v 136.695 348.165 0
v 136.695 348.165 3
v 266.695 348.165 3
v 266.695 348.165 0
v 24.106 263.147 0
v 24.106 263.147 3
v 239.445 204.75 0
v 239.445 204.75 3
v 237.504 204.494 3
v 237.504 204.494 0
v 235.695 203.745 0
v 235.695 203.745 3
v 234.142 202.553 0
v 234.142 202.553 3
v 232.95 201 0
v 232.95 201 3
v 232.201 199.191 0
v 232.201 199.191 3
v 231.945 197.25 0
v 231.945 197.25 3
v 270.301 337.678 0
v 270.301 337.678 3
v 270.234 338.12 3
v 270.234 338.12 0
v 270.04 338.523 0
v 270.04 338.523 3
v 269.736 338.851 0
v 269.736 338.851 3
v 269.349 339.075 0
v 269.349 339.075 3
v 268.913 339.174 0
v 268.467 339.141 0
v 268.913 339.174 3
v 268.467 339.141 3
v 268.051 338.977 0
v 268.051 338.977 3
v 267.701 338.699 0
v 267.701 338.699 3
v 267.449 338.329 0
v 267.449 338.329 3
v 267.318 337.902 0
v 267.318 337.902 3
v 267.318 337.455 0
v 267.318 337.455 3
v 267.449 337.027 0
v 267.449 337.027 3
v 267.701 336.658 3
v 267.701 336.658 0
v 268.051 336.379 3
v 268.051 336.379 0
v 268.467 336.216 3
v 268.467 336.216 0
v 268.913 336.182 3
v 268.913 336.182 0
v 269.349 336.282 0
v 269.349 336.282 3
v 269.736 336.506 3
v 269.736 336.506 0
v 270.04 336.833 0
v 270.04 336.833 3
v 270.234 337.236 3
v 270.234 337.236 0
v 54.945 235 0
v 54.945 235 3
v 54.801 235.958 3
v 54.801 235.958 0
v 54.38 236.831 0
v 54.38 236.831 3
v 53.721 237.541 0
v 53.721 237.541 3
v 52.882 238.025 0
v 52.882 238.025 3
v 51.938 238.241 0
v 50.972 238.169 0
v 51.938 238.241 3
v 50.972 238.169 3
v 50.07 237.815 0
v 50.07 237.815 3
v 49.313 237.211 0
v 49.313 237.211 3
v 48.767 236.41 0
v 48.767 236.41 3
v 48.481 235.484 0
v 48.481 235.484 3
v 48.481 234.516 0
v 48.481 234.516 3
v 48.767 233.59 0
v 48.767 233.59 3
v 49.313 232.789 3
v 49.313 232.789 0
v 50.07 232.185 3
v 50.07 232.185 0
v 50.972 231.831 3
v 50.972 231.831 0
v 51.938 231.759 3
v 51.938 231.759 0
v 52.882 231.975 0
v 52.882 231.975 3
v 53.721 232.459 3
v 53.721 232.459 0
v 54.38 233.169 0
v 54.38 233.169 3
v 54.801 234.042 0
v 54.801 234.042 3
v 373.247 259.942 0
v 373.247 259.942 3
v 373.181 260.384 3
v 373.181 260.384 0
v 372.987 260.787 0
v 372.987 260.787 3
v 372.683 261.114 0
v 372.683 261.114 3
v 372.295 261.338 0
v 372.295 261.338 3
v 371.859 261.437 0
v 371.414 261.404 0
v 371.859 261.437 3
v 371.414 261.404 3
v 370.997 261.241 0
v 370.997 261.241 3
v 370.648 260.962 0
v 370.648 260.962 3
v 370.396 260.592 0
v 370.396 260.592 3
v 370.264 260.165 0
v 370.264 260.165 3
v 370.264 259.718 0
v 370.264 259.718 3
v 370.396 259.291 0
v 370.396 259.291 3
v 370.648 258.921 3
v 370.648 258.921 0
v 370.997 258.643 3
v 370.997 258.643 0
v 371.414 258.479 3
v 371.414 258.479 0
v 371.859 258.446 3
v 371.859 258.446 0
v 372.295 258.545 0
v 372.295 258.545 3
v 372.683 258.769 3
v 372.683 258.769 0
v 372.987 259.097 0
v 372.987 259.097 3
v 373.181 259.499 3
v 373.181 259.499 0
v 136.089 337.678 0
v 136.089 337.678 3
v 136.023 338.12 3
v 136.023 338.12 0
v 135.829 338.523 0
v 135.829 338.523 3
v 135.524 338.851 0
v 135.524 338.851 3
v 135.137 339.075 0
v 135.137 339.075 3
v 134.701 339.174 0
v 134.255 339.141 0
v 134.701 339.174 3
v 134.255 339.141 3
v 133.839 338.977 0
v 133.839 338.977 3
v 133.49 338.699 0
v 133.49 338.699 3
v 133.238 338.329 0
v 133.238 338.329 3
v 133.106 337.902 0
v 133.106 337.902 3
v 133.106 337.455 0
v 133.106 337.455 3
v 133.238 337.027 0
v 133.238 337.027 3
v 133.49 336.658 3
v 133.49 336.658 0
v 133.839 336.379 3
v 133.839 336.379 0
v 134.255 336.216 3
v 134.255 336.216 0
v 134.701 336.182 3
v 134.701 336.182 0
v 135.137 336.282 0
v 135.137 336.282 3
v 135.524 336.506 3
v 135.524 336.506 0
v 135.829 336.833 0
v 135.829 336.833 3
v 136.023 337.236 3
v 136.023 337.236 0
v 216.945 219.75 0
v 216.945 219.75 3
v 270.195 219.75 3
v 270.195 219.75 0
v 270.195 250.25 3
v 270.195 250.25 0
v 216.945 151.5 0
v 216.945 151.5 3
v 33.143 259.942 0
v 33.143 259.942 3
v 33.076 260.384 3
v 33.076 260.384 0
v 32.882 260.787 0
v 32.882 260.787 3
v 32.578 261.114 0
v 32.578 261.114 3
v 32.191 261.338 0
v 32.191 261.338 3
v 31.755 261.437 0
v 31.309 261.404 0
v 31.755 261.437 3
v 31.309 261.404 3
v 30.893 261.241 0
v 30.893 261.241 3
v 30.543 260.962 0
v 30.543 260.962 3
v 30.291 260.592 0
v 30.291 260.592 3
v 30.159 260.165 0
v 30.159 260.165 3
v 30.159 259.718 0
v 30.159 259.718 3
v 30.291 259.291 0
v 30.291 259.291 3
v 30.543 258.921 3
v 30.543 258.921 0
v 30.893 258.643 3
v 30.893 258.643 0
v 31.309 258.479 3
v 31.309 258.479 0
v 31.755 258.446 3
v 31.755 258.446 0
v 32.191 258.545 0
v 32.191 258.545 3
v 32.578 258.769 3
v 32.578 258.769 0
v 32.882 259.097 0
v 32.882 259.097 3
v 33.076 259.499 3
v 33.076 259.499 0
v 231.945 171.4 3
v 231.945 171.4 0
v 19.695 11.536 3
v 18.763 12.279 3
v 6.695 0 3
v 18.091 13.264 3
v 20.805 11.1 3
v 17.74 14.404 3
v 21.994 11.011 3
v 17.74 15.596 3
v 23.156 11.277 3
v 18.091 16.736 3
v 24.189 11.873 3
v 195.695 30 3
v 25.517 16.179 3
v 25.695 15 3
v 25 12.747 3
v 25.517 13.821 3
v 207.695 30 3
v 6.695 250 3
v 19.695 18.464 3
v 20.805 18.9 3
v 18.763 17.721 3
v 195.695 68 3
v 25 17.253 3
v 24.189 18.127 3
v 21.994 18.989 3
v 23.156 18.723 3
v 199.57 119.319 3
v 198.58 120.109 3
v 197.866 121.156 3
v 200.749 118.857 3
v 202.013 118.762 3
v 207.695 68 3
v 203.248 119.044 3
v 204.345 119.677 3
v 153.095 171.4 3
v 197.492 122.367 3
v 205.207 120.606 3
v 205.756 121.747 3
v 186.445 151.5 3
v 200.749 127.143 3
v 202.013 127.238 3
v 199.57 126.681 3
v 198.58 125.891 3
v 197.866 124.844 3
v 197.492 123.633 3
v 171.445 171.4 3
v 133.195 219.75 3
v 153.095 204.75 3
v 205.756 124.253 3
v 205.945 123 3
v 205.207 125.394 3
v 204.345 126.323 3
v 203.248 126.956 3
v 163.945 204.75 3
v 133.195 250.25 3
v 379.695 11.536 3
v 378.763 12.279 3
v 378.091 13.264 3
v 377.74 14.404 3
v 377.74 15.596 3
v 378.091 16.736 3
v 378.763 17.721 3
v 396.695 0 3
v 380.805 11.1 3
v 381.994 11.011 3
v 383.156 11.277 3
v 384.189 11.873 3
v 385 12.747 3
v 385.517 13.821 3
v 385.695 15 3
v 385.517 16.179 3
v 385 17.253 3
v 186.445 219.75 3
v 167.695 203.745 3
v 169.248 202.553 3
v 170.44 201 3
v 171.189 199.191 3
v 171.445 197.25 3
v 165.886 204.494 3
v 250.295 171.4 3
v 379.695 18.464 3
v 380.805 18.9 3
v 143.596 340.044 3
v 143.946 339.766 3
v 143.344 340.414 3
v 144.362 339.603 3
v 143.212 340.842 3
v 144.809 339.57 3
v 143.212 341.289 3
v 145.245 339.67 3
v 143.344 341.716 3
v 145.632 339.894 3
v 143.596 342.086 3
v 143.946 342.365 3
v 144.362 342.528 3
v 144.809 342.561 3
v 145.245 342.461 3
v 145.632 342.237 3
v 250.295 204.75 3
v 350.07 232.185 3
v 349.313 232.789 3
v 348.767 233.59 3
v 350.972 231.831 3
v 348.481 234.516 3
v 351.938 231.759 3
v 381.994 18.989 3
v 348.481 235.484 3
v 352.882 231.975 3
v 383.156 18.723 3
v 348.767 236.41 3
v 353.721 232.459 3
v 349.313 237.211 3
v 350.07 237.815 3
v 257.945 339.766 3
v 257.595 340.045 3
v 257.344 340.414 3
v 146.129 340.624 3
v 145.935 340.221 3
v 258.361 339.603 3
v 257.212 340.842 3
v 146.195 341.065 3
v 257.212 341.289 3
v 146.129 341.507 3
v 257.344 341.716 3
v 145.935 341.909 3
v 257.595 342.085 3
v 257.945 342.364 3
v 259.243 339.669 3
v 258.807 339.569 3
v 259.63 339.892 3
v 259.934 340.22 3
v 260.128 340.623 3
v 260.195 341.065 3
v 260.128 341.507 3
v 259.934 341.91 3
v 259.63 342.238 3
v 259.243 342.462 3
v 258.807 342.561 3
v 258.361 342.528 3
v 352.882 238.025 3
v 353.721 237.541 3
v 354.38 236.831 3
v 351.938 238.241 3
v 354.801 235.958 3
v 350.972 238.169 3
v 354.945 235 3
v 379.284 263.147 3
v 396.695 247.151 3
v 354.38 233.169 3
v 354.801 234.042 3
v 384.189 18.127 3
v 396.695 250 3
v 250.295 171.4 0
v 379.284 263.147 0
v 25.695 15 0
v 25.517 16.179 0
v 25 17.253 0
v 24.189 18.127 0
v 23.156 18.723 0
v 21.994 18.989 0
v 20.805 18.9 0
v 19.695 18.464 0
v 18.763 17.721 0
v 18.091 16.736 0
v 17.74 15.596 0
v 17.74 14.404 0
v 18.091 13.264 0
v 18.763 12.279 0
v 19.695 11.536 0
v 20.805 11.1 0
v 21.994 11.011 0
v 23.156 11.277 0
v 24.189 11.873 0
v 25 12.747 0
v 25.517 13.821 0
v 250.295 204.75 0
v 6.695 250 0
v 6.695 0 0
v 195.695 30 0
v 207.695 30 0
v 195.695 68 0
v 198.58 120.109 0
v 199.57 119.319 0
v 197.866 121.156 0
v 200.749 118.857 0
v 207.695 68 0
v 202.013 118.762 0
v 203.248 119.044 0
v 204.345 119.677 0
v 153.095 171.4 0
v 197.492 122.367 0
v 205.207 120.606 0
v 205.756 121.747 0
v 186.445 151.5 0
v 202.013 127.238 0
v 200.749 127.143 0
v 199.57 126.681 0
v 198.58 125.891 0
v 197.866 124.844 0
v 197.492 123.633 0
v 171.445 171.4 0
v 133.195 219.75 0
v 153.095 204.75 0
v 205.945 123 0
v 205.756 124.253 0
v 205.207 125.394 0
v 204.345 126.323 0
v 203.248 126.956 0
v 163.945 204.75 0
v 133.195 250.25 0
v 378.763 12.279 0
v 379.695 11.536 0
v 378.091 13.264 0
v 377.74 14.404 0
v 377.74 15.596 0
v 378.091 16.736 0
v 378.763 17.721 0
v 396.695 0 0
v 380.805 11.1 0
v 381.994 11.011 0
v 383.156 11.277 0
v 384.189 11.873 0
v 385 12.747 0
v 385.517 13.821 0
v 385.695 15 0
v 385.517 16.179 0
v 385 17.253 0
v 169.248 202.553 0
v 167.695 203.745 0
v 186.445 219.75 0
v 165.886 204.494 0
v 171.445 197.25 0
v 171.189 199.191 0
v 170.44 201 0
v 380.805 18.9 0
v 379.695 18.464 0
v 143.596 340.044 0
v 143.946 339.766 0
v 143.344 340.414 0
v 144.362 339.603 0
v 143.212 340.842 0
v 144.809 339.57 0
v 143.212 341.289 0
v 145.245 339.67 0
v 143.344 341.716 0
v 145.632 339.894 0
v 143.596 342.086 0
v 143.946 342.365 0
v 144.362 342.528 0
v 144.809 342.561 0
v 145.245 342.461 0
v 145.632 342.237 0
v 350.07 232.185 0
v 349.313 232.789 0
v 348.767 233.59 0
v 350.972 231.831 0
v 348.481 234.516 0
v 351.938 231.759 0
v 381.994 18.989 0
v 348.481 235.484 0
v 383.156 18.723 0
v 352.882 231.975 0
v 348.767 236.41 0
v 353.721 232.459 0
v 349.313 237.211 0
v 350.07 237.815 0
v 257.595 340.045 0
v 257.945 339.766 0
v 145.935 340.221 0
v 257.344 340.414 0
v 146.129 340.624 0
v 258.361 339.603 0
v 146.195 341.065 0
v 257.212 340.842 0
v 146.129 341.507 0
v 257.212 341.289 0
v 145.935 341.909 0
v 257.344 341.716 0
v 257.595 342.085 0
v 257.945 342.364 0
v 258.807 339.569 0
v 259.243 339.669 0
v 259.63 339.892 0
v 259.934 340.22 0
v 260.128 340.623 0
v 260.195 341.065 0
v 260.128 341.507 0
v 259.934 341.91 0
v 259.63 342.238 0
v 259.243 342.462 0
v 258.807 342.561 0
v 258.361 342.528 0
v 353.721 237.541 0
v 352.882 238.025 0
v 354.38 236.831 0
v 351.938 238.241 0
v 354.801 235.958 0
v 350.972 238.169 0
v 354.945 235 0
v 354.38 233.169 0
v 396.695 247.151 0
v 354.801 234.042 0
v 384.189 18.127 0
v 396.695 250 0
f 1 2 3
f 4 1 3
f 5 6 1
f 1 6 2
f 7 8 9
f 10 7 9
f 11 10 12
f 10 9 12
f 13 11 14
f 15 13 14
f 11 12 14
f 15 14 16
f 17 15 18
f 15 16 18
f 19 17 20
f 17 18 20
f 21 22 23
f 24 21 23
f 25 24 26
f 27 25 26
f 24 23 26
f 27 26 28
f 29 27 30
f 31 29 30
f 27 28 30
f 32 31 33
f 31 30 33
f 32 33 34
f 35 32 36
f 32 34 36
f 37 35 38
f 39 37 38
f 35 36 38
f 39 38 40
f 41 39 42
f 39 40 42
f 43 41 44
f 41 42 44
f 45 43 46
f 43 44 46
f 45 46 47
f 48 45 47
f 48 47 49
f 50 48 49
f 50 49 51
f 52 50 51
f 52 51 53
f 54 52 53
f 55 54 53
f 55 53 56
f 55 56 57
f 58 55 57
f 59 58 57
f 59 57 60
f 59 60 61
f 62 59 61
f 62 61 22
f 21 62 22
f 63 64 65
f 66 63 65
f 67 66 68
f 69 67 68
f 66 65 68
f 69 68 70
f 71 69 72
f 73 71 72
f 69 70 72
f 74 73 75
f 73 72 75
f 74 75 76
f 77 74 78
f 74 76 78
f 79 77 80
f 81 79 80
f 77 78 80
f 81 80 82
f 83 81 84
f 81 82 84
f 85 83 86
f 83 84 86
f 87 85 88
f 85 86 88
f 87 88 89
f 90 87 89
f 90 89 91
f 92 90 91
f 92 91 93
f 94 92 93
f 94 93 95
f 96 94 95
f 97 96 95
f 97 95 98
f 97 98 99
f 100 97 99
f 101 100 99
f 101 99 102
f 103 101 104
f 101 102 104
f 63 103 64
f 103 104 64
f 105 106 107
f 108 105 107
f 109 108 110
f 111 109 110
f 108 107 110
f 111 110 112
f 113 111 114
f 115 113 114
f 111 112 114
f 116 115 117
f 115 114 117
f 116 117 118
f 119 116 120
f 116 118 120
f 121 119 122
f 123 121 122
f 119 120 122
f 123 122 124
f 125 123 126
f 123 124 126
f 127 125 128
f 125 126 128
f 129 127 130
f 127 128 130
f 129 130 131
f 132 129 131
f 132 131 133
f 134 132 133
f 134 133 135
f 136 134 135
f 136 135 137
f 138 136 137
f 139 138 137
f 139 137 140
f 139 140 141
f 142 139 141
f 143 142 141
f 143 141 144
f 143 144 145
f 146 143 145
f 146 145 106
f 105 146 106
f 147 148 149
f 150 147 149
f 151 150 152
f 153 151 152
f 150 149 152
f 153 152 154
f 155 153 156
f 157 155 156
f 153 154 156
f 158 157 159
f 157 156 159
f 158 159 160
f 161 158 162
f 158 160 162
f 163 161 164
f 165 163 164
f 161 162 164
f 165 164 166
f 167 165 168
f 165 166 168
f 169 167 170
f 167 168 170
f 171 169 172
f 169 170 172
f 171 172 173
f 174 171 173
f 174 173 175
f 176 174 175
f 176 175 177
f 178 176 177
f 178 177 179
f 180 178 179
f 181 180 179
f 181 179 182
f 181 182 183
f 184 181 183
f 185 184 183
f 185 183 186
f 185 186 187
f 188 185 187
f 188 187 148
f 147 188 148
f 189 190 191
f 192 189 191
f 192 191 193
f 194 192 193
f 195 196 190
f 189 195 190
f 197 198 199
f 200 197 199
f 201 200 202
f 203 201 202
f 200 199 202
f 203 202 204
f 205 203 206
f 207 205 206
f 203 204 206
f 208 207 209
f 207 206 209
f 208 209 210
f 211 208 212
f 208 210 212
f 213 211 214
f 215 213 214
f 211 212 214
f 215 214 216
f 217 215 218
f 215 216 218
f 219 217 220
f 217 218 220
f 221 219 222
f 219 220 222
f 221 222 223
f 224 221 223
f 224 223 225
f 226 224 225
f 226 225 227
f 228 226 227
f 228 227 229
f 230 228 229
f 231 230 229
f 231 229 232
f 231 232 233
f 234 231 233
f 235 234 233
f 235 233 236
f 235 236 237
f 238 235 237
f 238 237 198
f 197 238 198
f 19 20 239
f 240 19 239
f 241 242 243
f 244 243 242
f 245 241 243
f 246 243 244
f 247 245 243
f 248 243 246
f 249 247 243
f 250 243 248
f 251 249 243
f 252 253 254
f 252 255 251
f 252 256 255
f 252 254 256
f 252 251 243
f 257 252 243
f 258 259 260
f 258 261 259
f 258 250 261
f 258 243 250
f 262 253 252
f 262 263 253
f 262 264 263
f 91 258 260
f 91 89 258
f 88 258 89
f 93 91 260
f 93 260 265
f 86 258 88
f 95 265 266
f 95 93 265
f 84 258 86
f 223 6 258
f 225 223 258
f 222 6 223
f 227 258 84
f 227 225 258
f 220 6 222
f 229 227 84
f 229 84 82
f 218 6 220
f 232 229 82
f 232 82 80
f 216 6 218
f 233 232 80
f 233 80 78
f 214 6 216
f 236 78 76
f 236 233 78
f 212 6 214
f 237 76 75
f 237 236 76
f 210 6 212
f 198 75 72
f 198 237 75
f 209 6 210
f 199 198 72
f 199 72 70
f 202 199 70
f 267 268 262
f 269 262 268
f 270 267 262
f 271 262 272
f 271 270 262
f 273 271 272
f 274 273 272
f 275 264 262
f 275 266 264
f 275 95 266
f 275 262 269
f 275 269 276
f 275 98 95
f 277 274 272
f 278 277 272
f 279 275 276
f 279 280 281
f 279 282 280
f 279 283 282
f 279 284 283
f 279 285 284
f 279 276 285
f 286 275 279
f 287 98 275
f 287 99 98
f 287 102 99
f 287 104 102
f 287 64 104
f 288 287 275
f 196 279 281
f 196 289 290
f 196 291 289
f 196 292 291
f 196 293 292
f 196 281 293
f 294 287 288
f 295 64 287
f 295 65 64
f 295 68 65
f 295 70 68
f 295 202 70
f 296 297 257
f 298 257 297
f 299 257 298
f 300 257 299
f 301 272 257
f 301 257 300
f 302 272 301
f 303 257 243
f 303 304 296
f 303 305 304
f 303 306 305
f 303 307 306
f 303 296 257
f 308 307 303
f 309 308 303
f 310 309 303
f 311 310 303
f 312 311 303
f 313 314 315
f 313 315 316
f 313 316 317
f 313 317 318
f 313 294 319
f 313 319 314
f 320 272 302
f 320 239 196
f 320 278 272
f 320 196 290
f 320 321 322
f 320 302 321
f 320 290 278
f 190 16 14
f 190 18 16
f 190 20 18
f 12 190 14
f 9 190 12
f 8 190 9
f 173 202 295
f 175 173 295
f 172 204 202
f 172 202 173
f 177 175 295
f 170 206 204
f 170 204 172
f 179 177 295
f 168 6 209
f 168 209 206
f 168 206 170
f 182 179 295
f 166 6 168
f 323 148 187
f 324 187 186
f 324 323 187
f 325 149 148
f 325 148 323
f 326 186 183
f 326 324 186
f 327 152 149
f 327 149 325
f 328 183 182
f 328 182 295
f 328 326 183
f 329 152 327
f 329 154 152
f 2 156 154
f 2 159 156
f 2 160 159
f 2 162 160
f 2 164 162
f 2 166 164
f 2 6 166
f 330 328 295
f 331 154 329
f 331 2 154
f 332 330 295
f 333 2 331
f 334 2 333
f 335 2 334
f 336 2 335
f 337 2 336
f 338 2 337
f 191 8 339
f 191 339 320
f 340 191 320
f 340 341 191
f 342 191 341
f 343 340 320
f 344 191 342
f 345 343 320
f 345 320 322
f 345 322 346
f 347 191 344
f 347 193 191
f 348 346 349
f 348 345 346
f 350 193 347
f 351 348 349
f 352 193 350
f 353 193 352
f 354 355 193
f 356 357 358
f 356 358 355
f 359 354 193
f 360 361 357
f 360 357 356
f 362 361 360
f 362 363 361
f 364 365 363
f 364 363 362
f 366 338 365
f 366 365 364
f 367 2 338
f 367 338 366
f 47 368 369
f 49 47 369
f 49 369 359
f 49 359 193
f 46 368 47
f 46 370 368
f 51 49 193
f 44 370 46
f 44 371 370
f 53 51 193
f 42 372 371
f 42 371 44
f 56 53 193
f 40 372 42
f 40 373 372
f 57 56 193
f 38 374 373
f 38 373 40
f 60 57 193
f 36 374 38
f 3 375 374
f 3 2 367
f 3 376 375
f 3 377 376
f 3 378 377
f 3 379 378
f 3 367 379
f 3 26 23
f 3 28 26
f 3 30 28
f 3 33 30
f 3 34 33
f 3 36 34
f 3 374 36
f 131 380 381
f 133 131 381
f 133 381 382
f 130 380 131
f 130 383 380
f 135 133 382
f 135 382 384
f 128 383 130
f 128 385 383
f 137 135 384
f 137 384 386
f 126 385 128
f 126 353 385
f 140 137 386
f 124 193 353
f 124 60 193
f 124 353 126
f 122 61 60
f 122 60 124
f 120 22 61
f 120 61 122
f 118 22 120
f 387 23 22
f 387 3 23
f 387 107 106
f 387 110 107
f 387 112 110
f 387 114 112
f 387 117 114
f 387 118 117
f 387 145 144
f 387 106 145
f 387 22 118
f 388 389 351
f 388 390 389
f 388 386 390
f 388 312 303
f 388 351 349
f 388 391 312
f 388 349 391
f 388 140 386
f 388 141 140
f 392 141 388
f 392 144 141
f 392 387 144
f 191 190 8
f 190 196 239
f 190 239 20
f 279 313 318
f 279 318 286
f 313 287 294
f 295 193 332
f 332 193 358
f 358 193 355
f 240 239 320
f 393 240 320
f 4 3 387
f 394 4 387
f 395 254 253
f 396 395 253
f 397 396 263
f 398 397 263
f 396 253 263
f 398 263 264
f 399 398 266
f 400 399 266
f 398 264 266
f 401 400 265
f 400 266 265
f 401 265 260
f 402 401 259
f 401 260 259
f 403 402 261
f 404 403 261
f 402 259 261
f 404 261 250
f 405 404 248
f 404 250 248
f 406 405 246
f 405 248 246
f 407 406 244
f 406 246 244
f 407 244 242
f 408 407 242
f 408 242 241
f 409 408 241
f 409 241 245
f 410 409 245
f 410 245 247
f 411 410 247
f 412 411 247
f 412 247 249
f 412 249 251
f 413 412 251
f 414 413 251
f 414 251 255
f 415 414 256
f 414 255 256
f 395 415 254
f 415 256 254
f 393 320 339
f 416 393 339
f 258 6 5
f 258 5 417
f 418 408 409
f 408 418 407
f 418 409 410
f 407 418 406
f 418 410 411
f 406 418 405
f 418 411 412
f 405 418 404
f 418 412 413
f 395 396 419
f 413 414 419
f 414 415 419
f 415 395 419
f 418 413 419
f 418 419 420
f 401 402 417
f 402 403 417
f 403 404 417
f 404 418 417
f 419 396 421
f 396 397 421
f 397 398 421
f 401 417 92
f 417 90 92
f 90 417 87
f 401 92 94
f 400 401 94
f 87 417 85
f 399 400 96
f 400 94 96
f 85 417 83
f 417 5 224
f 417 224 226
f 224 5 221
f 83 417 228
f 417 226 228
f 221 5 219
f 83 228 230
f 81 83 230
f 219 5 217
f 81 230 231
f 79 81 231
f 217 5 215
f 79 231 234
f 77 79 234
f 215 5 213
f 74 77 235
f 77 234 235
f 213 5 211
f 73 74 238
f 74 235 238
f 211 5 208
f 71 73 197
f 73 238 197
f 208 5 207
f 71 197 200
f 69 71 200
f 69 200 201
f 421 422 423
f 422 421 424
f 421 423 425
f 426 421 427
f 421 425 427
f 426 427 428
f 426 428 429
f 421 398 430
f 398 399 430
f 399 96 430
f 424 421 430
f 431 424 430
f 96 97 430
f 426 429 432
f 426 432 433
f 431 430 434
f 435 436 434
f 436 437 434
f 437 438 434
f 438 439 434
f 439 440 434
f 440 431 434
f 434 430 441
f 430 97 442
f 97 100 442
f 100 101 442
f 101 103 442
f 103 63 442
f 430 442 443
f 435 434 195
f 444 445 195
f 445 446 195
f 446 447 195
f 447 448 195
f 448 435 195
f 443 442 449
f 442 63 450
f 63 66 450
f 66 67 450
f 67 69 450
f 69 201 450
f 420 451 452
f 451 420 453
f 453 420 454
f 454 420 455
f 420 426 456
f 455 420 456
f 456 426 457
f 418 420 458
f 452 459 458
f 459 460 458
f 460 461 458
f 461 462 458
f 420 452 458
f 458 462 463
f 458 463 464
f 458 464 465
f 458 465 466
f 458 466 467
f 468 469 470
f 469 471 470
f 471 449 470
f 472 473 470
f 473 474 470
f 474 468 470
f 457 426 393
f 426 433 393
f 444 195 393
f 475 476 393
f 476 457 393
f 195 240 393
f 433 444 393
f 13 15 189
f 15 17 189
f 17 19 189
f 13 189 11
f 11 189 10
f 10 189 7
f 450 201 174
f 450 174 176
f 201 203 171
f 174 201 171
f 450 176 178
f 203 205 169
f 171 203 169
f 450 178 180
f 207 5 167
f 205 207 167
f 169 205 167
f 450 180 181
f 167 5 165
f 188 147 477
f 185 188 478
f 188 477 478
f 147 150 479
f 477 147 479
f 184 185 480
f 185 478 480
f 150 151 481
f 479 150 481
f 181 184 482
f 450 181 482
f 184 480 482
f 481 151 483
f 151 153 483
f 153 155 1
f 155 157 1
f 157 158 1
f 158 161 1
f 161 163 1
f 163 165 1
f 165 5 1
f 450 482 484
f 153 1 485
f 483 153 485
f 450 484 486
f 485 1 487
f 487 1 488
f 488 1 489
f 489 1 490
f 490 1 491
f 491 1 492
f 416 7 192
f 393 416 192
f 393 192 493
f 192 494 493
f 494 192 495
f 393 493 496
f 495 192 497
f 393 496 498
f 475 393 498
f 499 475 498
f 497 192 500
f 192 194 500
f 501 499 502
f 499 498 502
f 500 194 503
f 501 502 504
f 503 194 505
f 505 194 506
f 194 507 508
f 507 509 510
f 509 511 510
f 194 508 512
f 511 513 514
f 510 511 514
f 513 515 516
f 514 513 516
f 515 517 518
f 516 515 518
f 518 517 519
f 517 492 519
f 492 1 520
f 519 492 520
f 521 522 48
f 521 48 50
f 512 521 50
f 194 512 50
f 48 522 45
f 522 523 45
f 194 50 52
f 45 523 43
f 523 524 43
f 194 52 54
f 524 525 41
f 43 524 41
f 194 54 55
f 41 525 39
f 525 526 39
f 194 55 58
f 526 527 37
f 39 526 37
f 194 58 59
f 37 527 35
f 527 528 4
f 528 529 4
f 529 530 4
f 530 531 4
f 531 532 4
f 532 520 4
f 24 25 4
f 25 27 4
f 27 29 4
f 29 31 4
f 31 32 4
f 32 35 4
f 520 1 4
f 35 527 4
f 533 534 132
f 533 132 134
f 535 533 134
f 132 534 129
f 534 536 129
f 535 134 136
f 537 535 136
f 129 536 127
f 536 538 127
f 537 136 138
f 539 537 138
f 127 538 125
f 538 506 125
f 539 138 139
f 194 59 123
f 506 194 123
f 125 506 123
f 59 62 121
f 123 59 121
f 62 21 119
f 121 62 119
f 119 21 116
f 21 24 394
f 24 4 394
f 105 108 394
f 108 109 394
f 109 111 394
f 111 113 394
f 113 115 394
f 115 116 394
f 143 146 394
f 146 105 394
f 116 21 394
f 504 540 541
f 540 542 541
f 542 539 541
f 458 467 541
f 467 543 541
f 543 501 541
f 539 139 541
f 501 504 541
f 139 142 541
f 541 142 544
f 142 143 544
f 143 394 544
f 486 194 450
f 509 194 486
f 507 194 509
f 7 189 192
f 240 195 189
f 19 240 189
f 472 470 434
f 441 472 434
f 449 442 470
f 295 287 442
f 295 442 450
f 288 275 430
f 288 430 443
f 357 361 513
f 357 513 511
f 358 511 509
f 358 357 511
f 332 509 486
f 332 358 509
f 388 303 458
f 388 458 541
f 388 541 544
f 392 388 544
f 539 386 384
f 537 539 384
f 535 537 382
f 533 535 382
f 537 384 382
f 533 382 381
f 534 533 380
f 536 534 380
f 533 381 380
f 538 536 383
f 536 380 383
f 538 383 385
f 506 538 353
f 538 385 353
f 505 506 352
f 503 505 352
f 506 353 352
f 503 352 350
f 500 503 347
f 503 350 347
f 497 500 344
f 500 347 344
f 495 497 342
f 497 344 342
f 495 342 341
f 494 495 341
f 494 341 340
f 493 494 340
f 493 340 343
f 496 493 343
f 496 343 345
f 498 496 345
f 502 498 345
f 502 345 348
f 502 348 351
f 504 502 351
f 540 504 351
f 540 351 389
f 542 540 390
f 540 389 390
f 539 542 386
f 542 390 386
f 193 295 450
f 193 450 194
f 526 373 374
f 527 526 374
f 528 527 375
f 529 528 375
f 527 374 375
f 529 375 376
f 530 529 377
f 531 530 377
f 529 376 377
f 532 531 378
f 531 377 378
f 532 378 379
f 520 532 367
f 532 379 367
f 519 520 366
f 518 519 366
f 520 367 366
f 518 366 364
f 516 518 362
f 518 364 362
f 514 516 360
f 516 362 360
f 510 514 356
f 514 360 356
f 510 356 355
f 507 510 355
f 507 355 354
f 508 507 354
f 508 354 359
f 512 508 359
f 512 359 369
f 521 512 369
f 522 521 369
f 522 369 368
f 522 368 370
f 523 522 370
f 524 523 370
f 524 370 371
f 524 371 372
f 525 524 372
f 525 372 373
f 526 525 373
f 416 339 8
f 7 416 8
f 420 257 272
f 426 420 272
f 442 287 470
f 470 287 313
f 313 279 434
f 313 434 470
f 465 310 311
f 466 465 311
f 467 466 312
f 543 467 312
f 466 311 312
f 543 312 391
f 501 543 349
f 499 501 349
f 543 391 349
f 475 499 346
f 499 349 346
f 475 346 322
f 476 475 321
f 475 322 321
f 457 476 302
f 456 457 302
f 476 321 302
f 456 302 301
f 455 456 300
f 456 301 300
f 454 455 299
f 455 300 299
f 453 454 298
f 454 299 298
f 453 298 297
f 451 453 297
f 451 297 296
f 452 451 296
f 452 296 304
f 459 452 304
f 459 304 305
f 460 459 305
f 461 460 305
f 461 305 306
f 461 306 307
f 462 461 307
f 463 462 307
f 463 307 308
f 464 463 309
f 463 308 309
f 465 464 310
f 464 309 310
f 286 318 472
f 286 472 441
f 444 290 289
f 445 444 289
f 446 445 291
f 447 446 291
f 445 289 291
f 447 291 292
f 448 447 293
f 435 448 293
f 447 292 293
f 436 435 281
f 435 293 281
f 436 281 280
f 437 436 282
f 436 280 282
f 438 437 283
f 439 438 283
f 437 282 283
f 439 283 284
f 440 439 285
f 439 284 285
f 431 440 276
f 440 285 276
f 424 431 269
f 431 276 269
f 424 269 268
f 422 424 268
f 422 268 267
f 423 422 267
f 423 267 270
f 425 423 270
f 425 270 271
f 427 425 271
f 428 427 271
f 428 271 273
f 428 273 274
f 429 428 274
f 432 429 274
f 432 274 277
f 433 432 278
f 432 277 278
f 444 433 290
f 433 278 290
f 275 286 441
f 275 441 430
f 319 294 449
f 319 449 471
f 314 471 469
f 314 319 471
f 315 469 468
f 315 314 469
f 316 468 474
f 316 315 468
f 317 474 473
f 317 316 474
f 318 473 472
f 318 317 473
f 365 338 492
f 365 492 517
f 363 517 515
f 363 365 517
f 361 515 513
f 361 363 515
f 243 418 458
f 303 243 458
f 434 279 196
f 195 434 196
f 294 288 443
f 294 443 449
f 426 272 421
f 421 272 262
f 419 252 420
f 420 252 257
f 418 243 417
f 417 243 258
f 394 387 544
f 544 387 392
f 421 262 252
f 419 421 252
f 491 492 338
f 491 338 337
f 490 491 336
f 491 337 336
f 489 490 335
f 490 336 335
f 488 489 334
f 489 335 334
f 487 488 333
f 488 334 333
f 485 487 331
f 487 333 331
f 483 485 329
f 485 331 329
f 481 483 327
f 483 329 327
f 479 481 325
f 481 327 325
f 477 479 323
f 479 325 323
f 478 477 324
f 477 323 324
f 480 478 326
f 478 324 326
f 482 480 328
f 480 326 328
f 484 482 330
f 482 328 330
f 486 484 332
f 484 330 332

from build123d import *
from build123d.topology import SkipClean

# Parameters (mm, degrees)
BOSS_EXTRUDE1_DEPTH     = 3
CROQUIS1_W              = 50.575264902
CROQUIS1_H              = 364.883290788
CROQUIS1_W_2            = 121.011581191
CROQUIS1_H_2            = 356.31671178
CORTAR_EXTRUIR1_DEPTH   = 10
CROQUIS2_W              = 390
CROQUIS2_H              = 250
SALIENTE_EXTRUIR1_DEPTH = 3
CROQUIS3_W              = 60
CROQUIS3_H              = 30
CORTAR_EXTRUIR3_DEPTH   = 3
CROQUIS4_W              = 90
CROQUIS4_H              = 3
SALIENTE_EXTRUIR2_DEPTH = 3
CROQUIS5_W              = 30
CROQUIS5_H              = 30
CORTAR_EXTRUIR4_DEPTH   = 3
CROQUIS6_W              = 30
CROQUIS6_H              = 38.5
CORTAR_EXTRUIR5_DEPTH   = 3
CROQUIS7_W              = 38.5
CROQUIS7_H              = 30
CORTAR_EXTRUIR6_DEPTH   = 3
CROQUIS8_W              = 137
CROQUIS8_H              = 0.25
CORTAR_EXTRUIR7_DEPTH   = 3
CROQUIS9_W              = 0.25
CROQUIS9_H              = 68.25
CORTAR_EXTRUIR8_DEPTH   = 3
CORTAR_EXTRUIR9_DEPTH   = 3
SALIENTE_EXTRUIR3_DEPTH = 3
CROQUIS12_R             = 4
CORTAR_EXTRUIR10_DEPTH  = 3
CROQUIS13_R             = 4.25
CROQUIS13_R_2           = 3.25
SALIENTE_EXTRUIR4_DEPTH = 3
CROQUIS14_R             = 4.25
CORTAR_EXTRUIR11_DEPTH  = 3
CROQUIS15_R             = 4.25
CORTAR_EXTRUIR12_DEPTH  = 25
SALIENTE_EXTRUIR5_DEPTH = 3
CROQUIS17_R             = 1.5
CORTAR_EXTRUIR13_DEPTH  = 10
CROQUIS18_R             = 1.5
CORTAR_EXTRUIR14_DEPTH  = 30
CROQUIS19_R             = 1.5
SALIENTE_EXTRUIR6_DEPTH = 3
CROQUIS21_R             = 1.5
CORTAR_EXTRUIR15_DEPTH  = 3
SALIENTE_EXTRUIR7_DEPTH = 3
CORTAR_EXTRUIR17_DEPTH  = 10
CORTAR_EXTRUIR18_DEPTH  = 10


with BuildPart() as part:
    # Sketch1 → Boss-Extrude1 (new body)
    with BuildSketch(Plane.XY):
        Polygon((0, 0), (403.39, 0), (403.39, 241), (274.41, 359.5), (128.98, 359.5), (0, 241), align=None)
        Polygon((216.695, 223), (246.695, 223), (246.695, 253), (156.695, 253), (156.695, 223), (186.695, 223), (186.695, 219.825), (216.695, 219.825), align=None, mode=Mode.SUBTRACT)
    extrude(amount=BOSS_EXTRUDE1_DEPTH)

    # Croquis1 → Cortar-Extruir1 (cut)
    with BuildSketch(Plane.XY.offset(3)):
        with Locations((-18.592632451, 182.441645394)):
            Rectangle(CROQUIS1_W, CROQUIS1_H)
        with Locations((457.200790596, 178.15835589)):
            Rectangle(CROQUIS1_W_2, CROQUIS1_H_2)
    extrude(amount=-CORTAR_EXTRUIR1_DEPTH, mode=Mode.SUBTRACT)

    # Croquis2 → Saliente-Extruir1 (add)
    with BuildSketch(Plane.XY.offset(3)):
        with Locations((201.695, 125)):
            Rectangle(CROQUIS2_W, CROQUIS2_H)
    extrude(amount=-SALIENTE_EXTRUIR1_DEPTH)

    # Croquis3 → Cortar-Extruir3 (cut)
    with BuildSketch(Plane.XY.offset(3)):
        with Locations((201.695, 235)):
            Rectangle(CROQUIS3_W, CROQUIS3_H)
    extrude(amount=-CORTAR_EXTRUIR3_DEPTH, mode=Mode.SUBTRACT)

    # Croquis4 → Saliente-Extruir2 (add)
    with BuildSketch(Plane.XY.offset(3)):
        with Locations((201.695, 251.5)):
            Rectangle(CROQUIS4_W, CROQUIS4_H)
    extrude(amount=-SALIENTE_EXTRUIR2_DEPTH)

    # Croquis5 → Cortar-Extruir4 (cut)
    with BuildSketch(Plane.XY.offset(3)):
        with Locations((201.695, 205)):
            Rectangle(CROQUIS5_W, CROQUIS5_H)
    extrude(amount=-CORTAR_EXTRUIR4_DEPTH, mode=Mode.SUBTRACT)

    # Croquis6 → Cortar-Extruir5 (cut)
    with BuildSketch(Plane.XY.offset(3)):
        with Locations((201.695, 170.75)):
            Rectangle(CROQUIS6_W, CROQUIS6_H)
    extrude(amount=-CORTAR_EXTRUIR5_DEPTH, mode=Mode.SUBTRACT)

    # Croquis7 → Cortar-Extruir6 (cut)
    with BuildSketch(Plane.XY.offset(3)):
        with Locations((152.445, 235)):
            Rectangle(CROQUIS7_W, CROQUIS7_H)
        with Locations((250.945, 235)):
            Rectangle(CROQUIS7_W, CROQUIS7_H)
    extrude(amount=-CORTAR_EXTRUIR6_DEPTH, mode=Mode.SUBTRACT)

    # Croquis8 → Cortar-Extruir7 (cut)
    with BuildSketch(Plane.XY.offset(3)):
        with Locations((201.695, 250.125)):
            Rectangle(CROQUIS8_W, CROQUIS8_H)
        with Locations((201.695, 219.875)):
            Rectangle(CROQUIS8_W, CROQUIS8_H)
    extrude(amount=-CORTAR_EXTRUIR7_DEPTH, mode=Mode.SUBTRACT)

    # Croquis9 → Cortar-Extruir8 (cut)
    with BuildSketch(Plane.XY.offset(3)):
        with Locations((186.57, 185.625)):
            Rectangle(CROQUIS9_W, CROQUIS9_H)
        with Locations((216.82, 185.625)):
            Rectangle(CROQUIS9_W, CROQUIS9_H)
    extrude(amount=-CORTAR_EXTRUIR8_DEPTH, mode=Mode.SUBTRACT)

    # Croquis10 → Cortar-Extruir9 (cut)
    with BuildSketch(Plane.XY.offset(3)):
        Polygon((136.695, 348.165217873), (266.695, 348.165217873), (396.695, 250), (402.242964747, 389.308105161), (24.251899655, 412.117910813), (6.695, 250), align=None)
    extrude(amount=-CORTAR_EXTRUIR9_DEPTH, mode=Mode.SUBTRACT)

    # Croquis11 → Saliente-Extruir3 (add)
    with BuildSketch(Plane.XY.offset(3)):
        Polygon((51.733112384, 284.009047037), (6.695, 250), (31.650370126, 216.951653685), align=None)
        Polygon((347.889102287, 286.854166019), (396.695, 250), (356.623353442, 225.729213199), align=None)
    extrude(amount=-SALIENTE_EXTRUIR3_DEPTH)

    # Croquis12 → Cortar-Extruir10 (cut)
    with BuildSketch(Plane.XY.offset(3)):
        with Locations((21.695, 15)):
            Circle(CROQUIS12_R)
        with Locations((381.695, 15)):
            Circle(CROQUIS12_R)
        with Locations((51.695, 235)):
            Circle(CROQUIS12_R)
        with Locations((351.695, 235)):
            Circle(CROQUIS12_R)
    extrude(amount=-CORTAR_EXTRUIR10_DEPTH, mode=Mode.SUBTRACT)

    # Croquis13 → Saliente-Extruir4 (add)
    # profile 1 of 2: a face of its own
    with BuildSketch(Plane.XY.offset(3)):
        with Locations((51.695, 235)):
            Circle(CROQUIS13_R)
        with Locations((51.695, 235)):
            Circle(CROQUIS13_R_2, mode=Mode.SUBTRACT)
    # profile 2 of 2: a face of its own
    with BuildSketch(Plane.XY.offset(3)):
        with Locations((351.695, 235)):
            Circle(CROQUIS13_R)
        with Locations((351.695, 235)):
            Circle(CROQUIS13_R_2, mode=Mode.SUBTRACT)
    extrude(amount=-SALIENTE_EXTRUIR4_DEPTH)

    # Croquis14 → Cortar-Extruir11 (cut)
    with BuildSketch(Plane.XY.offset(3)):
        with Locations((201.695, 35)):
            Circle(CROQUIS14_R)
        with Locations((201.695, 123)):
            Circle(CROQUIS14_R)
    extrude(amount=-CORTAR_EXTRUIR11_DEPTH, mode=Mode.SUBTRACT)

    # Croquis15 → Cortar-Extruir12 (cut)
    with BuildSketch(Plane.XY.offset(3)):
        with Locations((201.695, 38)):
            Circle(CROQUIS15_R)
    extrude(amount=-CORTAR_EXTRUIR12_DEPTH, mode=Mode.SUBTRACT)

    # Croquis16 → Saliente-Extruir5 (add)
    with BuildSketch(Plane.XY.offset(3)):
        with BuildLine():
            ThreePointArc((205.67149343, 36.5), (201.695, 33.75), (197.71850657, 36.5))
            ThreePointArc((197.71850657, 36.5), (200.9326343, 30.818935717), (205.945, 35))
            ThreePointArc((205.945, 35), (205.876064283, 35.7623657), (205.67149343, 36.5))
        make_face()
    extrude(amount=-SALIENTE_EXTRUIR5_DEPTH)

    # Croquis17 → Cortar-Extruir13 (cut)
    with BuildSketch(Plane.XY.offset(3)):
        with Locations((146.568722662, 341.065217873)):
            Circle(CROQUIS17_R)
        with Locations((254.977292633, 341.065217873)):
            Circle(CROQUIS17_R)
        with Locations((134.589248293, 337.678282679)):
            Circle(CROQUIS17_R)
        with Locations((31.642655291, 259.941553977)):
            Circle(CROQUIS17_R)
        with Locations((268.800751707, 337.678282679)):
            Circle(CROQUIS17_R)
        with Locations((371.747344709, 259.941553977)):
            Circle(CROQUIS17_R)
    extrude(amount=-CORTAR_EXTRUIR13_DEPTH, mode=Mode.SUBTRACT)

    # Croquis18 → Cortar-Extruir14 (cut)
    with BuildSketch(Plane.XY.offset(3)):
        with Locations((144.695, 341.065217873)):
            Circle(CROQUIS18_R)
        with Locations((258.695, 341.065217873)):
            Circle(CROQUIS18_R)
    extrude(amount=-CORTAR_EXTRUIR14_DEPTH, mode=Mode.SUBTRACT)

    # Croquis19 → Saliente-Extruir6 (add)
    with BuildSketch(Plane.XY.offset(3)):
        with BuildLine():
            ThreePointArc((145.631861331, 339.893769689), (145.068722662, 341.065217873), (145.631861331, 342.236666056))
            ThreePointArc((145.631861331, 342.236666056), (143.195, 341.065217873), (145.631861331, 339.893769689))
        make_face()
        with Locations((254.977292633, 341.065217873)):
            Circle(CROQUIS19_R)
    extrude(amount=-SALIENTE_EXTRUIR6_DEPTH)

    # Croquis21 → Cortar-Extruir15 (cut)
    with BuildSketch(Plane.XY.offset(3)):
        with Locations((144.695, 341.065217873)):
            Circle(CROQUIS21_R)
    extrude(amount=-CORTAR_EXTRUIR15_DEPTH, mode=Mode.SUBTRACT)

    # Croquis22 → Saliente-Extruir7 (add)
    with BuildSketch(Plane.XY.offset(3)):
        with BuildLine():
            ThreePointArc((145.631861331, 342.236666056), (146.046904582, 341.715105557), (146.195, 341.065217873))
            ThreePointArc((146.195, 341.065217873), (146.046904582, 340.415330189), (145.631861331, 339.893769689))
            ThreePointArc((145.631861331, 339.893769689), (147.218610346, 339.713313291), (148.068722662, 341.065217873))
            ThreePointArc((148.068722662, 341.065217873), (147.218610346, 342.417122454), (145.631861331, 342.236666056))
        make_face()
    extrude(amount=-SALIENTE_EXTRUIR7_DEPTH)

    # Croquis23 → Cortar-Extruir17 (cut)
    with BuildSketch(Plane.XY.offset(3)):
        with BuildLine():
            ThreePointArc((163.945, 204.75), (169.248300859, 202.553300859), (171.445, 197.25))
            Line((171.445, 197.25), (171.445, 171.4))
            Line((171.445, 171.4), (153.095, 171.4))
            Line((153.095, 171.4), (153.095, 204.75))
            Line((153.095, 204.75), (163.945, 204.75))
        make_face()
        with BuildLine():
            Line((250.295, 204.75), (239.445, 204.75))
            ThreePointArc((239.445, 204.75), (234.141699141, 202.553300859), (231.945, 197.25))
            Line((231.945, 197.25), (231.945, 171.4))
            Line((231.945, 171.4), (250.295, 171.4))
            Line((250.295, 171.4), (250.295, 204.75))
        make_face()
    extrude(amount=-CORTAR_EXTRUIR17_DEPTH, mode=Mode.SUBTRACT)

    # Croquis25 → Cortar-Extruir18 (cut)
    with SkipClean():  # the faces are left unmerged after this step: merging them gives an invalid solid
        with BuildSketch(Plane.XY.offset(3)):
            Polygon((195.695, 38), (195.695, 30), (207.695, 30), (207.695, 38), (207.695, 68), (195.695, 68), align=None)
        extrude(amount=-CORTAR_EXTRUIR18_DEPTH, mode=Mode.SUBTRACT)


solid = part.part
